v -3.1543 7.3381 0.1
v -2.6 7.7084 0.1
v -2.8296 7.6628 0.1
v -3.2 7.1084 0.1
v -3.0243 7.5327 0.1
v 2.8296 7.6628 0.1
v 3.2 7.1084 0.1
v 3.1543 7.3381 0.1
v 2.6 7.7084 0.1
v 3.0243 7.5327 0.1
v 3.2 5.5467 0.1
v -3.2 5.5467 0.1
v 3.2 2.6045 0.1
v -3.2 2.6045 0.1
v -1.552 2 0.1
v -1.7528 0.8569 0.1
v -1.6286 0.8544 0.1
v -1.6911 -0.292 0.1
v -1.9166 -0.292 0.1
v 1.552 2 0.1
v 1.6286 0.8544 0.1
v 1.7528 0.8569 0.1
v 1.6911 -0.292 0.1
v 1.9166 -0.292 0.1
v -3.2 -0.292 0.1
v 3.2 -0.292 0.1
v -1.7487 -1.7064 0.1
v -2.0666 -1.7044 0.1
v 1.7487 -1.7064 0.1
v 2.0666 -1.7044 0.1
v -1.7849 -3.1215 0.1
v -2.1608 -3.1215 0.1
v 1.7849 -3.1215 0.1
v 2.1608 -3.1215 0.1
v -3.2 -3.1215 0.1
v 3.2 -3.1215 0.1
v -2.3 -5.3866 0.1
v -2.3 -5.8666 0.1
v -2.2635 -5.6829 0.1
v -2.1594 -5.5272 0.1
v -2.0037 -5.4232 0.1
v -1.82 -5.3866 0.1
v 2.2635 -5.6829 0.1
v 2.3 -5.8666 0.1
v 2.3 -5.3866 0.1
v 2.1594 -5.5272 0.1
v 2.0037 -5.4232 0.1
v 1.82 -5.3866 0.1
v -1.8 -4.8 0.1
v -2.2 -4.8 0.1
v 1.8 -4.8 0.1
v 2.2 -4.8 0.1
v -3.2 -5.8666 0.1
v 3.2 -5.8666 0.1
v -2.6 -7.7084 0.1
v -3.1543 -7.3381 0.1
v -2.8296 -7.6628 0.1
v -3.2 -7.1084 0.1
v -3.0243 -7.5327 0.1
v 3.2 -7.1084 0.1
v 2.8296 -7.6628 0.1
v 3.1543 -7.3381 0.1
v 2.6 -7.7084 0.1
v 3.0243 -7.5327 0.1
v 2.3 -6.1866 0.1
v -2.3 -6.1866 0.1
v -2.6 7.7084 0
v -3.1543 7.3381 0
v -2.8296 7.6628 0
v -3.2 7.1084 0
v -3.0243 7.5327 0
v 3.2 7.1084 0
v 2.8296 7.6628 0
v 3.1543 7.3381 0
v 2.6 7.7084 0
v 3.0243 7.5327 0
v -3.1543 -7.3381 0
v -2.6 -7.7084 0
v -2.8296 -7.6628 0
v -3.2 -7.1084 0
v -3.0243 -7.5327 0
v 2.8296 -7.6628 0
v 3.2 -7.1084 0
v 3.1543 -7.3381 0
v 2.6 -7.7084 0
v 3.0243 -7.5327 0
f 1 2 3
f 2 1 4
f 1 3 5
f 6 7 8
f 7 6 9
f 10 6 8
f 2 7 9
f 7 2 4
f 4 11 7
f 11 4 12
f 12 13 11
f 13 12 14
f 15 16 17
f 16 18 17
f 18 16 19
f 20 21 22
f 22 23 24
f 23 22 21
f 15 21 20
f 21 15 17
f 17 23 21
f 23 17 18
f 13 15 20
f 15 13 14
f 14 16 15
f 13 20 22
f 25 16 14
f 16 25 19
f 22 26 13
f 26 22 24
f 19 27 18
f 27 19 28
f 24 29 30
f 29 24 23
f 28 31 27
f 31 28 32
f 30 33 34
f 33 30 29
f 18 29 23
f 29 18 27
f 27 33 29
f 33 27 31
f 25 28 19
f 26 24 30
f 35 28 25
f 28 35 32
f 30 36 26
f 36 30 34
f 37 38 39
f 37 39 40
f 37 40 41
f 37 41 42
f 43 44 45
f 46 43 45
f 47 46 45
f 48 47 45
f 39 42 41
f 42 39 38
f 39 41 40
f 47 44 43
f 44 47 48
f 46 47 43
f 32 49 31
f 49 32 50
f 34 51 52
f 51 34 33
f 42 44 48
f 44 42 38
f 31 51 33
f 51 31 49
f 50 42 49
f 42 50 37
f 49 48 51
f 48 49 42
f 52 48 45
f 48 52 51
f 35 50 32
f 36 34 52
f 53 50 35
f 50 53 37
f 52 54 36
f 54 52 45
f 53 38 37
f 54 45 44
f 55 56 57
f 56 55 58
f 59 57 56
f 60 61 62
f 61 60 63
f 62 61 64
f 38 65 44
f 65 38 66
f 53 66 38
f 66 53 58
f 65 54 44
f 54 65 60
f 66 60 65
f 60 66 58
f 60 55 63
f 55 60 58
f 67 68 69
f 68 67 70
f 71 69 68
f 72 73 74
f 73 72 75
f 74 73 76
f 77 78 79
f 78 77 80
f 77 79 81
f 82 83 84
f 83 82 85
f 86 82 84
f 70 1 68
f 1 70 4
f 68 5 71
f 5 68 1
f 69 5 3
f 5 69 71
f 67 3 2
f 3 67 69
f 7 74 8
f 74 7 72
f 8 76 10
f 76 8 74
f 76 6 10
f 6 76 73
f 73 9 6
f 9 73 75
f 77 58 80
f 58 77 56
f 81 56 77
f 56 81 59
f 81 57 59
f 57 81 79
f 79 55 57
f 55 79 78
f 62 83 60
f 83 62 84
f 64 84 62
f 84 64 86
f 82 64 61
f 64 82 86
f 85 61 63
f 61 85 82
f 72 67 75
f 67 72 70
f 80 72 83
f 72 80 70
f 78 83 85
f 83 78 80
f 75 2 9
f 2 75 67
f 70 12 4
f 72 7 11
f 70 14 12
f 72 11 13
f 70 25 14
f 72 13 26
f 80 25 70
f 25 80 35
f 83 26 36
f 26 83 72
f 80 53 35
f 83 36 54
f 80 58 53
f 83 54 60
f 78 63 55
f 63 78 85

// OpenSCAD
// file: ../p/1-4cyli.scad
use <../lib.scad>
function ldraw_lib__1_4cyli() = [
// 0 Cylinder 0.25
// 0 Name: 1-4cyli.dat
// 0 Author: James Jessiman
// 0 !LDRAW_ORG Primitive UPDATE 2012-01
// 0 !LICENSE Licensed under CC BY 4.0 : see CAreadme.txt
// 
// 0 BFC CERTIFY CCW
  [0,"BFC","CERTIFY"],
  [0,"BFC","CCW"],
// 
// 0 !HISTORY 2002-03-23 [sbliss] Added BFC statement.
// 0 !HISTORY 2002-04-25 [PTadmin] Official Update 2002-02
// 0 !HISTORY 2007-06-22 [PTadmin] Header formatted for Contributor Agreement
// 0 !HISTORY 2008-07-01 [PTadmin] Official Update 2008-01
// 0 !HISTORY 2012-02-16 [Philo] Changed to CCW
// 0 !HISTORY 2012-03-30 [PTadmin] Official Update 2012-01
// 
// 
// 4 16 1 1 0 0.9239 1 0.3827 0.9239 0 0.3827 1 0 0
  [4,16,1,1,0,0.9239,1,0.3827,0.9239,0,0.3827,1,0,0],
// 5 24 1 0 0 1 1 0 0.9239 0 0.3827 1 0 -1
  [5,24,1,0,0,1,1,0,0.9239,0,0.3827,1,0,-1],
// 4 16 0.9239 1 0.3827 0.7071 1 0.7071 0.7071 0 0.7071 0.9239 0 0.3827
  [4,16,0.9239,1,0.3827,0.7071,1,0.7071,0.7071,0,0.7071,0.9239,0,0.3827],
// 5 24 0.9239 0 0.3827 0.9239 1 0.3827 0.7071 0 0.7071 1 0 0
  [5,24,0.9239,0,0.3827,0.9239,1,0.3827,0.7071,0,0.7071,1,0,0],
// 4 16 0.7071 1 0.7071 0.3827 1 0.9239 0.3827 0 0.9239 0.7071 0 0.7071
  [4,16,0.7071,1,0.7071,0.3827,1,0.9239,0.3827,0,0.9239,0.7071,0,0.7071],
// 5 24 0.7071 0 0.7071 0.7071 1 0.7071 0.3827 0 0.9239 0.9239 0 0.3827
  [5,24,0.7071,0,0.7071,0.7071,1,0.7071,0.3827,0,0.9239,0.9239,0,0.3827],
// 4 16 0.3827 1 0.9239 0 1 1 0 0 1 0.3827 0 0.9239
  [4,16,0.3827,1,0.9239,0,1,1,0,0,1,0.3827,0,0.9239],
// 5 24 0.3827 0 0.9239 0.3827 1 0.9239 0 0 1 0.7071 0 0.7071
  [5,24,0.3827,0,0.9239,0.3827,1,0.9239,0,0,1,0.7071,0,0.7071],
// 5 24 0 0 1 0 1 1 0.3827 0 0.9239 -1 0 1
  [5,24,0,0,1,0,1,1,0.3827,0,0.9239,-1,0,1],
];
module ldraw_lib__1_4cyli(step=0, col=false, unit=2/5, alt=false, line=0.2, solid=!$preview)
    makepoly(ldraw_lib__1_4cyli(), step=step, col=col, unit=unit, alt=alt, line=line, solid=solid);
ldraw_lib__1_4cyli(line=0.2);
// file: ../p/1-4ndis.scad
use <../lib.scad>
function ldraw_lib__1_4ndis() = [
// 0 Disc Negative 0.25
// 0 Name: 1-4ndis.dat
// 0 Author: James Jessiman
// 0 !LDRAW_ORG Primitive UPDATE 2012-01
// 0 !LICENSE Licensed under CC BY 4.0 : see CAreadme.txt
// 
// 0 BFC CERTIFY CCW
  [0,"BFC","CERTIFY"],
  [0,"BFC","CCW"],
// 
// 0 !HISTORY 2002-03-23 [sbliss] Added BFC Statement
// 0 !HISTORY 2002-04-25 [PTadmin] Official Update 2002-02
// 0 !HISTORY 2007-06-22 [PTadmin] Header formatted for Contributor Agreement
// 0 !HISTORY 2008-07-01 [PTadmin] Official Update 2008-01
// 0 !HISTORY 2012-02-16 [Philo] Changed to CCW
// 0 !HISTORY 2012-03-30 [PTadmin] Official Update 2012-01
// 
// 
// 3 16 0.9239 0 0.3827 1 0 0 1 0 1
  [3,16,0.9239,0,0.3827,1,0,0,1,0,1],
// 3 16 0.7071 0 0.7071 0.9239 0 0.3827 1 0 1
  [3,16,0.7071,0,0.7071,0.9239,0,0.3827,1,0,1],
// 3 16 0.3827 0 0.9239 0.7071 0 0.7071 1 0 1
  [3,16,0.3827,0,0.9239,0.7071,0,0.7071,1,0,1],
// 3 16 0 0 1 0.3827 0 0.9239 1 0 1
  [3,16,0,0,1,0.3827,0,0.9239,1,0,1],
];
module ldraw_lib__1_4ndis(step=0, col=false, unit=2/5, alt=false, line=0.2, solid=!$preview)
    makepoly(ldraw_lib__1_4ndis(), step=step, col=col, unit=unit, alt=alt, line=line, solid=solid);
ldraw_lib__1_4ndis(line=0.2);
// file: ../p/1-4chrd.scad
use <../lib.scad>
function ldraw_lib__1_4chrd() = [
// 0 Chord 0.25
// 0 Name: 1-4chrd.dat
// 0 Author: Max Martin Richter [MMR1988]
// 0 !LDRAW_ORG Primitive UPDATE 2023-05
// 0 !LICENSE Licensed under CC BY 4.0 : see CAreadme.txt
// 
// 0 BFC CERTIFY CCW
  [0,"BFC","CERTIFY"],
  [0,"BFC","CCW"],
// 
// 0 !HISTORY 2004-04-22 [PTadmin] Official Update 2004-02
// 0 !HISTORY 2007-10-09 [PTadmin] Header formatted for Contributor Agreement
// 0 !HISTORY 2008-07-01 [PTadmin] Official Update 2008-01
// 0 !HISTORY 2012-08-02 [MMR1988] Re-creation with PrimGen2 and Rectifier
// 0 !HISTORY 2012-08-09 [PTadmin] Official Update 2012-02
// 0 !HISTORY 2023-10-27 [OrionP] Change author to MMR1988 from hafhead
// 0 !HISTORY 2023-10-31 [OrionP] Official Update 2023-05
// 
// 4 16 0.9239 0 0.3827 0.3827 0 0.9239 0 0 1 1 0 0
  [4,16,0.9239,0,0.3827,0.3827,0,0.9239,0,0,1,1,0,0],
// 3 16 0.7071 0 0.7071 0.3827 0 0.9239 0.9239 0 0.3827
  [3,16,0.7071,0,0.7071,0.3827,0,0.9239,0.9239,0,0.3827],
];
module ldraw_lib__1_4chrd(step=0, col=false, unit=2/5, alt=false, line=0.2, solid=!$preview)
    makepoly(ldraw_lib__1_4chrd(), step=step, col=col, unit=unit, alt=alt, line=line, solid=solid);
ldraw_lib__1_4chrd(line=0.2);
// file: s/6142275ads06.scad
use <../../lib.scad>
use <../../p/1-4chrd.scad>
use <../../p/1-4cyli.scad>
function ldraw_lib__s__6142275ads06() = [
// 0 ~Sticker  1.9 x  0.8 with Black Airscoope on White Background - Bottom Face
// 0 Name: s\6142275ads06.dat
// 0 Author: Massimo Maso [Sirio]
// 0 !LDRAW_ORG Subpart UPDATE 2023-06
// 0 !LICENSE Licensed under CC BY 4.0 : see CAreadme.txt
// 
// 0 BFC CERTIFY CCW
  [0,"BFC","CERTIFY"],
  [0,"BFC","CCW"],
// 
// 0 !HISTORY 2023-11-19 [OrionP] Official Update 2023-06
// 
// 
// 0 // Primitives
// 1 16 -6.5 0 17.7711 -1.5 0 0 0 -1 0 0 0 1.5 1-4chrd.dat
  [1,16,-6.5,0,17.7711,-1.5,0,0,0,-1,0,0,0,1.5, ldraw_lib__1_4chrd()],
// 1 16 6.5 0 17.7711 1.5 0 0 0 -1 0 0 0 1.5 1-4chrd.dat
  [1,16,6.5,0,17.7711,1.5,0,0,0,-1,0,0,0,1.5, ldraw_lib__1_4chrd()],
// 1 16 -6.5 0 -17.7711 -1.5 0 0 0 -1 0 0 0 -1.5 1-4chrd.dat
  [1,16,-6.5,0,-17.7711,-1.5,0,0,0,-1,0,0,0,-1.5, ldraw_lib__1_4chrd()],
// 1 16 6.5 0 -17.7711 1.5 0 0 0 -1 0 0 0 -1.5 1-4chrd.dat
  [1,16,6.5,0,-17.7711,1.5,0,0,0,-1,0,0,0,-1.5, ldraw_lib__1_4chrd()],
// 1 16 -6.5 -0.25 17.7711 -1.5 0 0 0 0.25 0 0 0 1.5 1-4cyli.dat
  [1,16,-6.5,-0.25,17.7711,-1.5,0,0,0,0.25,0,0,0,1.5, ldraw_lib__1_4cyli()],
// 1 16 6.5 -0.25 17.7711 1.5 0 0 0 0.25 0 0 0 1.5 1-4cyli.dat
  [1,16,6.5,-0.25,17.7711,1.5,0,0,0,0.25,0,0,0,1.5, ldraw_lib__1_4cyli()],
// 1 16 -6.5 -0.25 -17.7711 -1.5 0 0 0 0.25 0 0 0 -1.5 1-4cyli.dat
  [1,16,-6.5,-0.25,-17.7711,-1.5,0,0,0,0.25,0,0,0,-1.5, ldraw_lib__1_4cyli()],
// 1 16 6.5 -0.25 -17.7711 1.5 0 0 0 0.25 0 0 0 -1.5 1-4cyli.dat
  [1,16,6.5,-0.25,-17.7711,1.5,0,0,0,0.25,0,0,0,-1.5, ldraw_lib__1_4cyli()],
// 0 // Bottom face
// 4 16 6.5 0 19.2711 8 0 17.7711 -8 0 17.7711 -6.5 0 19.2711
  [4,16,6.5,0,19.2711,8,0,17.7711,-8,0,17.7711,-6.5,0,19.2711],
// 4 16 8 0 17.7711 8 0 -17.7711 -8 0 -17.7711 -8 0 17.7711
  [4,16,8,0,17.7711,8,0,-17.7711,-8,0,-17.7711,-8,0,17.7711],
// 4 16 8 0 -17.7711 6.5 0 -19.2711 -6.5 0 -19.2711 -8 0 -17.7711
  [4,16,8,0,-17.7711,6.5,0,-19.2711,-6.5,0,-19.2711,-8,0,-17.7711],
// 0 // Lateral face
// 4 16 -6.5 0 19.2711 -6.5 -.25 19.2711 6.5 -.25 19.2711 6.5 0 19.2711
  [4,16,-6.5,0,19.2711,-6.5,-.25,19.2711,6.5,-.25,19.2711,6.5,0,19.2711],
// 3 16 -8 0 17.7711 -8 -.25 13.8668 -8 -.25 17.7711
  [3,16,-8,0,17.7711,-8,-.25,13.8668,-8,-.25,17.7711],
// 3 16 8 0 17.7711 8 -.25 17.7711 8 -.25 13.8668
  [3,16,8,0,17.7711,8,-.25,17.7711,8,-.25,13.8668],
// 3 16 -8 0 17.7711 -8 -.25 6.5112 -8 -.25 13.8668
  [3,16,-8,0,17.7711,-8,-.25,6.5112,-8,-.25,13.8668],
// 3 16 8 0 17.7711 8 -.25 13.8668 8 -.25 6.5112
  [3,16,8,0,17.7711,8,-.25,13.8668,8,-.25,6.5112],
// 3 16 -8 0 17.7711 -8 -.25 -.73 -8 -.25 6.5112
  [3,16,-8,0,17.7711,-8,-.25,-.73,-8,-.25,6.5112],
// 3 16 8 0 17.7711 8 -.25 6.5112 8 -.25 -.73
  [3,16,8,0,17.7711,8,-.25,6.5112,8,-.25,-.73],
// 4 16 -8 0 17.7711 -8 0 -17.7711 -8 -.25 -7.8038 -8 -.25 -.73
  [4,16,-8,0,17.7711,-8,0,-17.7711,-8,-.25,-7.8038,-8,-.25,-.73],
// 4 16 8 0 17.7711 8 -.25 -.73 8 -.25 -7.8038 8 0 -17.7711
  [4,16,8,0,17.7711,8,-.25,-.73,8,-.25,-7.8038,8,0,-17.7711],
// 3 16 -8 0 -17.7711 -8 -.25 -14.6666 -8 -.25 -7.8038
  [3,16,-8,0,-17.7711,-8,-.25,-14.6666,-8,-.25,-7.8038],
// 3 16 8 0 -17.7711 8 -.25 -7.8038 8 -.25 -14.6666
  [3,16,8,0,-17.7711,8,-.25,-7.8038,8,-.25,-14.6666],
// 3 16 -8 0 -17.7711 -8 -.25 -17.7711 -8 -.25 -14.6666
  [3,16,-8,0,-17.7711,-8,-.25,-17.7711,-8,-.25,-14.6666],
// 3 16 8 0 -17.7711 8 -.25 -14.6666 8 -.25 -17.7711
  [3,16,8,0,-17.7711,8,-.25,-14.6666,8,-.25,-17.7711],
// 4 16 -6.5 0 -19.2711 6.5 0 -19.2711 6.5 -.25 -19.2711 -6.5 -.25 -19.2711
  [4,16,-6.5,0,-19.2711,6.5,0,-19.2711,6.5,-.25,-19.2711,-6.5,-.25,-19.2711],
];
module ldraw_lib__s__6142275ads06(step=0, col=false, unit=2/5, alt=false, line=0.2, solid=!$preview)
    makepoly(ldraw_lib__s__6142275ads06(), step=step, col=col, unit=unit, alt=alt, line=line, solid=solid);
ldraw_lib__s__6142275ads06(line=0.2);
// file: s/6142275ads05.scad
use <../../lib.scad>
use <../../p/1-4chrd.scad>
function ldraw_lib__s__6142275ads05() = [
// 0 ~Sticker  1.9 x  0.8 with Black Airscoope on White Background - Sixth Face
// 0 Name: s\6142275ads05.dat
// 0 Author: Massimo Maso [Sirio]
// 0 !LDRAW_ORG Subpart UPDATE 2023-06
// 0 !LICENSE Licensed under CC BY 4.0 : see CAreadme.txt
// 
// 0 BFC CERTIFY CCW
  [0,"BFC","CERTIFY"],
  [0,"BFC","CCW"],
// 
// 0 !HISTORY 2023-11-19 [OrionP] Official Update 2023-06
// 
// 
// 0 // Primitives
// 1 15 -6.5 -.25 -3.0901 -1.5 0 0 0 1 0 0 0 -1.5 1-4chrd.dat
  [1,15,-6.5,-.25,-3.0901,-1.5,0,0,0,1,0,0,0,-1.5, ldraw_lib__1_4chrd()],
// 1 15 6.5 -.25 -3.0901 1.5 0 0 0 1 0 0 0 -1.5 1-4chrd.dat
  [1,15,6.5,-.25,-3.0901,1.5,0,0,0,1,0,0,0,-1.5, ldraw_lib__1_4chrd()],
// 0 // Black faces
// 4 0 -5.75 -.25 .0144 -5.75 -.25 -.7856 5.75 -.25 -.7856 5.75 -.25 .0144
  [4,0,-5.75,-.25,.0144,-5.75,-.25,-.7856,5.75,-.25,-.7856,5.75,-.25,.0144],
// 0 // White faces
// 4 15 -8 -.25 .0144 -8 -.25 -3.0901 -5.75 -.25 -.7856 -5.75 -.25 .0144
  [4,15,-8,-.25,.0144,-8,-.25,-3.0901,-5.75,-.25,-.7856,-5.75,-.25,.0144],
// 4 15 8 -.25 .0144 5.75 -.25 .0144 5.75 -.25 -.7856 8 -.25 -3.0901
  [4,15,8,-.25,.0144,5.75,-.25,.0144,5.75,-.25,-.7856,8,-.25,-3.0901],
// 4 15 -5.75 -.25 -.7856 -8 -.25 -3.0901 8 -.25 -3.0901 5.75 -.25 -.7856
  [4,15,-5.75,-.25,-.7856,-8,-.25,-3.0901,8,-.25,-3.0901,5.75,-.25,-.7856],
// 4 15 8 -.25 -3.0901 -8 -.25 -3.0901 -6.5 -.25 -4.5901 6.5 -.25 -4.5901
  [4,15,8,-.25,-3.0901,-8,-.25,-3.0901,-6.5,-.25,-4.5901,6.5,-.25,-4.5901],
];
module ldraw_lib__s__6142275ads05(step=0, col=false, unit=2/5, alt=false, line=0.2, solid=!$preview)
    makepoly(ldraw_lib__s__6142275ads05(), step=step, col=col, unit=unit, alt=alt, line=line, solid=solid);
ldraw_lib__s__6142275ads05(line=0.2);
// file: s/6142275ads04.scad
use <../../lib.scad>
use <../../p/1-4chrd.scad>
use <../../p/1-4ndis.scad>
function ldraw_lib__s__6142275ads04() = [
// 0 ~Sticker  1.9 x  0.8 with Black Airscoope on White Background - Fifth Face
// 0 Name: s\6142275ads04.dat
// 0 Author: Massimo Maso [Sirio]
// 0 !LDRAW_ORG Subpart UPDATE 2023-06
// 0 !LICENSE Licensed under CC BY 4.0 : see CAreadme.txt
// 
// 0 BFC CERTIFY CCW
  [0,"BFC","CERTIFY"],
  [0,"BFC","CCW"],
// 
// 0 !HISTORY 2023-11-19 [OrionP] Official Update 2023-06
// 
// 
// 0 // Primitives
// 1 15 -4.55 -.25 -.0144 -1.2 0 0 0 1 0 0 0 1.2 1-4ndis.dat
  [1,15,-4.55,-.25,-.0144,-1.2,0,0,0,1,0,0,0,1.2, ldraw_lib__1_4ndis()],
// 1 15 4.55 -.25 -.0144 1.2 0 0 0 1 0 0 0 1.2 1-4ndis.dat
  [1,15,4.55,-.25,-.0144,1.2,0,0,0,1,0,0,0,1.2, ldraw_lib__1_4ndis()],
// 1 0 -4.55 -.25 -.0144 -1.2 0 0 0 1 0 0 0 1.2 1-4chrd.dat
  [1,0,-4.55,-.25,-.0144,-1.2,0,0,0,1,0,0,0,1.2, ldraw_lib__1_4chrd()],
// 1 0 4.55 -.25 -.0144 1.2 0 0 0 1 0 0 0 1.2 1-4chrd.dat
  [1,0,4.55,-.25,-.0144,1.2,0,0,0,1,0,0,0,1.2, ldraw_lib__1_4chrd()],
// 0 // Black faces
// 4 0 -5.4021 -.25 6.8484 -5.5 -.25 2.6522 -4.5 -.25 2.6522 -4.4623 -.25 6.8484
  [4,0,-5.4021,-.25,6.8484,-5.5,-.25,2.6522,-4.5,-.25,2.6522,-4.4623,-.25,6.8484],
// 4 0 5.4021 -.25 6.8484 4.4623 -.25 6.8484 4.5 -.25 2.6522 5.5 -.25 2.6522
  [4,0,5.4021,-.25,6.8484,4.4623,-.25,6.8484,4.5,-.25,2.6522,5.5,-.25,2.6522],
// 4 0 -4.55 -.25 1.1856 -5.75 -.25 -.0144 5.75 -.25 -.0144 4.55 -.25 1.1856
  [4,0,-4.55,-.25,1.1856,-5.75,-.25,-.0144,5.75,-.25,-.0144,4.55,-.25,1.1856],
// 0 // White faces
// 4 15 -4.4623 -.25 6.8484 -4.5 -.25 2.6522 4.5 -.25 2.6522 4.4623 -.25 6.8484
  [4,15,-4.4623,-.25,6.8484,-4.5,-.25,2.6522,4.5,-.25,2.6522,4.4623,-.25,6.8484],
// 4 15 -5.5 -.25 2.6522 -5.75 -.25 1.1856 -4.55 -.25 1.1856 -4.5 -.25 2.6522
  [4,15,-5.5,-.25,2.6522,-5.75,-.25,1.1856,-4.55,-.25,1.1856,-4.5,-.25,2.6522],
// 4 15 -4.5 -.25 2.6522 -4.55 -.25 1.1856 4.55 -.25 1.1856 4.5 -.25 2.6522
  [4,15,-4.5,-.25,2.6522,-4.55,-.25,1.1856,4.55,-.25,1.1856,4.5,-.25,2.6522],
// 4 15 4.5 -.25 2.6522 4.55 -.25 1.1856 5.75 -.25 1.1856 5.5 -.25 2.6522
  [4,15,4.5,-.25,2.6522,4.55,-.25,1.1856,5.75,-.25,1.1856,5.5,-.25,2.6522],
// 3 15 -8 -.25 6.8484 -5.5 -.25 2.6522 -5.4021 -.25 6.8484
  [3,15,-8,-.25,6.8484,-5.5,-.25,2.6522,-5.4021,-.25,6.8484],
// 3 15 8 -.25 6.8484 5.4021 -.25 6.8484 5.5 -.25 2.6522
  [3,15,8,-.25,6.8484,5.4021,-.25,6.8484,5.5,-.25,2.6522],
// 4 15 -8 -.25 6.8484 -8 -.25 -.0144 -5.75 -.25 1.1856 -5.5 -.25 2.6522
  [4,15,-8,-.25,6.8484,-8,-.25,-.0144,-5.75,-.25,1.1856,-5.5,-.25,2.6522],
// 4 15 8 -.25 6.8484 5.5 -.25 2.6522 5.75 -.25 1.1856 8 -.25 -.0144
  [4,15,8,-.25,6.8484,5.5,-.25,2.6522,5.75,-.25,1.1856,8,-.25,-.0144],
// 3 15 -8 -.25 -.0144 -5.75 -.25 -.0144 -5.75 -.25 1.1856
  [3,15,-8,-.25,-.0144,-5.75,-.25,-.0144,-5.75,-.25,1.1856],
// 3 15 8 -.25 -.0144 5.75 -.25 1.1856 5.75 -.25 -.0144
  [3,15,8,-.25,-.0144,5.75,-.25,1.1856,5.75,-.25,-.0144],
];
module ldraw_lib__s__6142275ads04(step=0, col=false, unit=2/5, alt=false, line=0.2, solid=!$preview)
    makepoly(ldraw_lib__s__6142275ads04(), step=step, col=col, unit=unit, alt=alt, line=line, solid=solid);
ldraw_lib__s__6142275ads04(line=0.2);
// file: s/6142275ads03.scad
use <../../lib.scad>
function ldraw_lib__s__6142275ads03() = [
// 0 ~Sticker  1.9 x  0.8 with Black Airscoope on White Background - Fourth Face
// 0 Name: s\6142275ads03.dat
// 0 Author: Massimo Maso [Sirio]
// 0 !LDRAW_ORG Subpart UPDATE 2023-06
// 0 !LICENSE Licensed under CC BY 4.0 : see CAreadme.txt
// 
// 0 BFC CERTIFY CCW
  [0,"BFC","CERTIFY"],
  [0,"BFC","CCW"],
// 
// 0 !HISTORY 2023-11-19 [OrionP] Official Update 2023-06
// 
// 
// 0 // Black faces
// 4 0 -5.1666 -.25 -3.5181 -4.3718 -.25 -3.5232 -4.2277 -.25 .0128 -4.7916 -.25 .0128
  [4,0,-5.1666,-.25,-3.5181,-4.3718,-.25,-3.5232,-4.2277,-.25,.0128,-4.7916,-.25,.0128],
// 4 0 5.1666 -.25 -3.5181 4.7916 -.25 .0128 4.2277 -.25 .0128 4.3718 -.25 -3.5232
  [4,0,5.1666,-.25,-3.5181,4.7916,-.25,.0128,4.2277,-.25,.0128,4.3718,-.25,-3.5232],
// 4 0 -5.1666 -.25 -3.5181 -5.4021 -.25 -7.061 -4.4623 -.25 -7.061 -4.3718 -.25 -3.5232
  [4,0,-5.1666,-.25,-3.5181,-5.4021,-.25,-7.061,-4.4623,-.25,-7.061,-4.3718,-.25,-3.5232],
// 4 0 5.1666 -.25 -3.5181 4.3718 -.25 -3.5232 4.4623 -.25 -7.061 5.4021 -.25 -7.061
  [4,0,5.1666,-.25,-3.5181,4.3718,-.25,-3.5232,4.4623,-.25,-7.061,5.4021,-.25,-7.061],
// 0 // White faces
// 4 15 -4.2277 -.25 .0128 -4.3718 -.25 -3.5232 4.3718 -.25 -3.5232 4.2277 -.25 .0128
  [4,15,-4.2277,-.25,.0128,-4.3718,-.25,-3.5232,4.3718,-.25,-3.5232,4.2277,-.25,.0128],
// 4 15 4.3718 -.25 -3.5232 -4.3718 -.25 -3.5232 -4.4623 -.25 -7.061 4.4623 -.25 -7.061
  [4,15,4.3718,-.25,-3.5232,-4.3718,-.25,-3.5232,-4.4623,-.25,-7.061,4.4623,-.25,-7.061],
// 3 15 -8 -.25 .0128 -5.1666 -.25 -3.5181 -4.7916 -.25 .0128
  [3,15,-8,-.25,.0128,-5.1666,-.25,-3.5181,-4.7916,-.25,.0128],
// 3 15 8 -.25 .0128 4.7916 -.25 .0128 5.1666 -.25 -3.5181
  [3,15,8,-.25,.0128,4.7916,-.25,.0128,5.1666,-.25,-3.5181],
// 4 15 -8 -.25 .0128 -8 -.25 -7.061 -5.4021 -.25 -7.061 -5.1666 -.25 -3.5181
  [4,15,-8,-.25,.0128,-8,-.25,-7.061,-5.4021,-.25,-7.061,-5.1666,-.25,-3.5181],
// 4 15 8 -.25 .0128 5.1666 -.25 -3.5181 5.4021 -.25 -7.061 8 -.25 -7.061
  [4,15,8,-.25,.0128,5.1666,-.25,-3.5181,5.4021,-.25,-7.061,8,-.25,-7.061],
];
module ldraw_lib__s__6142275ads03(step=0, col=false, unit=2/5, alt=false, line=0.2, solid=!$preview)
    makepoly(ldraw_lib__s__6142275ads03(), step=step, col=col, unit=unit, alt=alt, line=line, solid=solid);
ldraw_lib__s__6142275ads03(line=0.2);
// file: s/6142275ads02.scad
use <../../lib.scad>
function ldraw_lib__s__6142275ads02() = [
// 0 ~Sticker  1.9 x  0.8 with Black Airscoope on White Background - Third Face
// 0 Name: s\6142275ads02.dat
// 0 Author: Massimo Maso [Sirio]
// 0 !LDRAW_ORG Subpart UPDATE 2023-06
// 0 !LICENSE Licensed under CC BY 4.0 : see CAreadme.txt
// 
// 0 BFC CERTIFY CCW
  [0,"BFC","CERTIFY"],
  [0,"BFC","CCW"],
// 
// 0 !HISTORY 2023-11-19 [OrionP] Official Update 2023-06
// 
// 
// 0 // Black faces
// 3 0 -3.8799 -.25 5.7172 -4.3819 -.25 2.8595 -4.0714 -.25 2.8533
  [3,0,-3.8799,-.25,5.7172,-4.3819,-.25,2.8595,-4.0714,-.25,2.8533],
// 4 0 -4.3819 -.25 2.8595 -4.7916 -.25 -.0128 -4.2277 -.25 -.0128 -4.0714 -.25 2.8533
  [4,0,-4.3819,-.25,2.8595,-4.7916,-.25,-.0128,-4.2277,-.25,-.0128,-4.0714,-.25,2.8533],
// 3 0 3.8799 -.25 5.7172 4.0714 -.25 2.8533 4.3819 -.25 2.8595
  [3,0,3.8799,-.25,5.7172,4.0714,-.25,2.8533,4.3819,-.25,2.8595],
// 4 0 4.0714 -.25 2.8533 4.2277 -.25 -.0128 4.7916 -.25 -.0128 4.3819 -.25 2.8595
  [4,0,4.0714,-.25,2.8533,4.2277,-.25,-.0128,4.7916,-.25,-.0128,4.3819,-.25,2.8595],
// 0 // White faces
// 4 15 -3.8799 -.25 5.7172 -4.0714 -.25 2.8533 4.0714 -.25 2.8533 3.8799 -.25 5.7172
  [4,15,-3.8799,-.25,5.7172,-4.0714,-.25,2.8533,4.0714,-.25,2.8533,3.8799,-.25,5.7172],
// 4 15 4.0714 -.25 2.8533 -4.0714 -.25 2.8533 -4.2277 -.25 -.0128 4.2277 -.25 -.0128
  [4,15,4.0714,-.25,2.8533,-4.0714,-.25,2.8533,-4.2277,-.25,-.0128,4.2277,-.25,-.0128],
// 4 15 -8 -.25 7.2284 -3.8799 -.25 5.7172 3.8799 -.25 5.7172 8 -.25 7.2284
  [4,15,-8,-.25,7.2284,-3.8799,-.25,5.7172,3.8799,-.25,5.7172,8,-.25,7.2284],
// 3 15 -8 -.25 7.2284 -4.3819 -.25 2.8595 -3.8799 -.25 5.7172
  [3,15,-8,-.25,7.2284,-4.3819,-.25,2.8595,-3.8799,-.25,5.7172],
// 3 15 8 -.25 7.2284 3.8799 -.25 5.7172 4.3819 -.25 2.8595
  [3,15,8,-.25,7.2284,3.8799,-.25,5.7172,4.3819,-.25,2.8595],
// 4 15 -8 -.25 7.2284 -8 -.25 -.0128 -4.7916 -.25 -.0128 -4.3819 -.25 2.8595
  [4,15,-8,-.25,7.2284,-8,-.25,-.0128,-4.7916,-.25,-.0128,-4.3819,-.25,2.8595],
// 4 15 8 -.25 7.2284 4.3819 -.25 2.8595 4.7916 -.25 -.0128 8 -.25 -.0128
  [4,15,8,-.25,7.2284,4.3819,-.25,2.8595,4.7916,-.25,-.0128,8,-.25,-.0128],
];
module ldraw_lib__s__6142275ads02(step=0, col=false, unit=2/5, alt=false, line=0.2, solid=!$preview)
    makepoly(ldraw_lib__s__6142275ads02(), step=step, col=col, unit=unit, alt=alt, line=line, solid=solid);
ldraw_lib__s__6142275ads02(line=0.2);
// file: s/6142275ads01.scad
use <../../lib.scad>
use <../../p/1-4chrd.scad>
function ldraw_lib__s__6142275ads01() = [
// 0 ~Sticker  1.9 x  0.8 with Black Airscoope on White Background - First Face
// 0 Name: s\6142275ads01.dat
// 0 Author: Massimo Maso [Sirio]
// 0 !LDRAW_ORG Subpart UPDATE 2023-06
// 0 !LICENSE Licensed under CC BY 4.0 : see CAreadme.txt
// 
// 0 BFC CERTIFY CCW
  [0,"BFC","CERTIFY"],
  [0,"BFC","CCW"],
// 
// 0 !HISTORY 2023-11-19 [OrionP] Official Update 2023-06
// 
// 
// 0 // Primitives
// 1 15 -6.5 -.25 3.8922 -1.5 0 0 0 1 0 0 0 1.5 1-4chrd.dat
  [1,15,-6.5,-.25,3.8922,-1.5,0,0,0,1,0,0,0,1.5, ldraw_lib__1_4chrd()],
// 1 15 6.5 -.25 3.8922 1.5 0 0 0 1 0 0 0 1.5 1-4chrd.dat
  [1,15,6.5,-.25,3.8922,1.5,0,0,0,1,0,0,0,1.5, ldraw_lib__1_4chrd()],
// 0 // White faces
// 4 15 -6.5 -.25 5.3922 -8 -.25 3.8922 8 -.25 3.8922 6.5 -.25 5.3922
  [4,15,-6.5,-.25,5.3922,-8,-.25,3.8922,8,-.25,3.8922,6.5,-.25,5.3922],
// 4 15 -8 -.25 3.8922 -8 -.25 -.0121 8 -.25 -.0121 8 -.25 3.8922
  [4,15,-8,-.25,3.8922,-8,-.25,-.0121,8,-.25,-.0121,8,-.25,3.8922],
];
module ldraw_lib__s__6142275ads01(step=0, col=false, unit=2/5, alt=false, line=0.2, solid=!$preview)
    makepoly(ldraw_lib__s__6142275ads01(), step=step, col=col, unit=unit, alt=alt, line=line, solid=solid);
ldraw_lib__s__6142275ads01(line=0.2);
// main file
use <../lib.scad>
use <s/6142275ads01.scad>
use <s/6142275ads02.scad>
use <s/6142275ads03.scad>
use <s/6142275ads04.scad>
use <s/6142275ads05.scad>
use <s/6142275ads06.scad>
function ldraw_lib__6142275ad() = [
// 0 Sticker  1.9 x  0.8 with Black Airscoope on White Background
// 0 Name: 6142275ad.dat
// 0 Author: Massimo Maso [Sirio]
// 0 !LDRAW_ORG Part UPDATE 2023-06
// 0 !LICENSE Licensed under CC BY 4.0 : see CAreadme.txt
// 
// 0 BFC CERTIFY CCW
  [0,"BFC","CERTIFY"],
  [0,"BFC","CCW"],
// 
// 0 !KEYWORDS Audi, e-tron, quattro, R18, Set 75872, Speed Champions
// 
// 0 !HISTORY 2023-11-19 [OrionP] Official Update 2023-06
// 
// 
// 1 16 0 0 13.8789 1 0 0 0 1 0 0 0 1 s\6142275ads01.dat
  [1,16,0,0,13.8789,1,0,0,0,1,0,0,0,1, ldraw_lib__s__6142275ads01()],
// 4 15 -8 -.25 13.8668 -8 -.25 6.5112 8 -.25 6.5112 8 -.25 13.8668
  [4,15,-8,-.25,13.8668,-8,-.25,6.5112,8,-.25,6.5112,8,-.25,13.8668],
// 1 16 0 0 -.7172 1 0 0 0 1 0 0 0 1 s\6142275ads02.dat
  [1,16,0,0,-.7172,1,0,0,0,1,0,0,0,1, ldraw_lib__s__6142275ads02()],
// 1 16 0 0 -.7428 1 0 0 0 1 0 0 0 1 s\6142275ads03.dat
  [1,16,0,0,-.7428,1,0,0,0,1,0,0,0,1, ldraw_lib__s__6142275ads03()],
// 1 16 0 0 -14.6522 1 0 0 0 1 0 0 0 1 s\6142275ads04.dat
  [1,16,0,0,-14.6522,1,0,0,0,1,0,0,0,1, ldraw_lib__s__6142275ads04()],
// 1 16 0 0 -14.6810 1 0 0 0 1 0 0 0 1 s\6142275ads05.dat
  [1,16,0,0,-14.6810,1,0,0,0,1,0,0,0,1, ldraw_lib__s__6142275ads05()],
// 1 16 0 0 0 1 0 0 0 1 0 0 0 1 s\6142275ads06.dat
  [1,16,0,0,0,1,0,0,0,1,0,0,0,1, ldraw_lib__s__6142275ads06()],
];
module ldraw_lib__6142275ad(step=0, col=false, unit=2/5, alt=false, line=0.2, solid=!$preview)
    makepoly(ldraw_lib__6142275ad(), step=step, col=col, unit=unit, alt=alt, line=line, solid=solid);
ldraw_lib__6142275ad(line=0.2);
